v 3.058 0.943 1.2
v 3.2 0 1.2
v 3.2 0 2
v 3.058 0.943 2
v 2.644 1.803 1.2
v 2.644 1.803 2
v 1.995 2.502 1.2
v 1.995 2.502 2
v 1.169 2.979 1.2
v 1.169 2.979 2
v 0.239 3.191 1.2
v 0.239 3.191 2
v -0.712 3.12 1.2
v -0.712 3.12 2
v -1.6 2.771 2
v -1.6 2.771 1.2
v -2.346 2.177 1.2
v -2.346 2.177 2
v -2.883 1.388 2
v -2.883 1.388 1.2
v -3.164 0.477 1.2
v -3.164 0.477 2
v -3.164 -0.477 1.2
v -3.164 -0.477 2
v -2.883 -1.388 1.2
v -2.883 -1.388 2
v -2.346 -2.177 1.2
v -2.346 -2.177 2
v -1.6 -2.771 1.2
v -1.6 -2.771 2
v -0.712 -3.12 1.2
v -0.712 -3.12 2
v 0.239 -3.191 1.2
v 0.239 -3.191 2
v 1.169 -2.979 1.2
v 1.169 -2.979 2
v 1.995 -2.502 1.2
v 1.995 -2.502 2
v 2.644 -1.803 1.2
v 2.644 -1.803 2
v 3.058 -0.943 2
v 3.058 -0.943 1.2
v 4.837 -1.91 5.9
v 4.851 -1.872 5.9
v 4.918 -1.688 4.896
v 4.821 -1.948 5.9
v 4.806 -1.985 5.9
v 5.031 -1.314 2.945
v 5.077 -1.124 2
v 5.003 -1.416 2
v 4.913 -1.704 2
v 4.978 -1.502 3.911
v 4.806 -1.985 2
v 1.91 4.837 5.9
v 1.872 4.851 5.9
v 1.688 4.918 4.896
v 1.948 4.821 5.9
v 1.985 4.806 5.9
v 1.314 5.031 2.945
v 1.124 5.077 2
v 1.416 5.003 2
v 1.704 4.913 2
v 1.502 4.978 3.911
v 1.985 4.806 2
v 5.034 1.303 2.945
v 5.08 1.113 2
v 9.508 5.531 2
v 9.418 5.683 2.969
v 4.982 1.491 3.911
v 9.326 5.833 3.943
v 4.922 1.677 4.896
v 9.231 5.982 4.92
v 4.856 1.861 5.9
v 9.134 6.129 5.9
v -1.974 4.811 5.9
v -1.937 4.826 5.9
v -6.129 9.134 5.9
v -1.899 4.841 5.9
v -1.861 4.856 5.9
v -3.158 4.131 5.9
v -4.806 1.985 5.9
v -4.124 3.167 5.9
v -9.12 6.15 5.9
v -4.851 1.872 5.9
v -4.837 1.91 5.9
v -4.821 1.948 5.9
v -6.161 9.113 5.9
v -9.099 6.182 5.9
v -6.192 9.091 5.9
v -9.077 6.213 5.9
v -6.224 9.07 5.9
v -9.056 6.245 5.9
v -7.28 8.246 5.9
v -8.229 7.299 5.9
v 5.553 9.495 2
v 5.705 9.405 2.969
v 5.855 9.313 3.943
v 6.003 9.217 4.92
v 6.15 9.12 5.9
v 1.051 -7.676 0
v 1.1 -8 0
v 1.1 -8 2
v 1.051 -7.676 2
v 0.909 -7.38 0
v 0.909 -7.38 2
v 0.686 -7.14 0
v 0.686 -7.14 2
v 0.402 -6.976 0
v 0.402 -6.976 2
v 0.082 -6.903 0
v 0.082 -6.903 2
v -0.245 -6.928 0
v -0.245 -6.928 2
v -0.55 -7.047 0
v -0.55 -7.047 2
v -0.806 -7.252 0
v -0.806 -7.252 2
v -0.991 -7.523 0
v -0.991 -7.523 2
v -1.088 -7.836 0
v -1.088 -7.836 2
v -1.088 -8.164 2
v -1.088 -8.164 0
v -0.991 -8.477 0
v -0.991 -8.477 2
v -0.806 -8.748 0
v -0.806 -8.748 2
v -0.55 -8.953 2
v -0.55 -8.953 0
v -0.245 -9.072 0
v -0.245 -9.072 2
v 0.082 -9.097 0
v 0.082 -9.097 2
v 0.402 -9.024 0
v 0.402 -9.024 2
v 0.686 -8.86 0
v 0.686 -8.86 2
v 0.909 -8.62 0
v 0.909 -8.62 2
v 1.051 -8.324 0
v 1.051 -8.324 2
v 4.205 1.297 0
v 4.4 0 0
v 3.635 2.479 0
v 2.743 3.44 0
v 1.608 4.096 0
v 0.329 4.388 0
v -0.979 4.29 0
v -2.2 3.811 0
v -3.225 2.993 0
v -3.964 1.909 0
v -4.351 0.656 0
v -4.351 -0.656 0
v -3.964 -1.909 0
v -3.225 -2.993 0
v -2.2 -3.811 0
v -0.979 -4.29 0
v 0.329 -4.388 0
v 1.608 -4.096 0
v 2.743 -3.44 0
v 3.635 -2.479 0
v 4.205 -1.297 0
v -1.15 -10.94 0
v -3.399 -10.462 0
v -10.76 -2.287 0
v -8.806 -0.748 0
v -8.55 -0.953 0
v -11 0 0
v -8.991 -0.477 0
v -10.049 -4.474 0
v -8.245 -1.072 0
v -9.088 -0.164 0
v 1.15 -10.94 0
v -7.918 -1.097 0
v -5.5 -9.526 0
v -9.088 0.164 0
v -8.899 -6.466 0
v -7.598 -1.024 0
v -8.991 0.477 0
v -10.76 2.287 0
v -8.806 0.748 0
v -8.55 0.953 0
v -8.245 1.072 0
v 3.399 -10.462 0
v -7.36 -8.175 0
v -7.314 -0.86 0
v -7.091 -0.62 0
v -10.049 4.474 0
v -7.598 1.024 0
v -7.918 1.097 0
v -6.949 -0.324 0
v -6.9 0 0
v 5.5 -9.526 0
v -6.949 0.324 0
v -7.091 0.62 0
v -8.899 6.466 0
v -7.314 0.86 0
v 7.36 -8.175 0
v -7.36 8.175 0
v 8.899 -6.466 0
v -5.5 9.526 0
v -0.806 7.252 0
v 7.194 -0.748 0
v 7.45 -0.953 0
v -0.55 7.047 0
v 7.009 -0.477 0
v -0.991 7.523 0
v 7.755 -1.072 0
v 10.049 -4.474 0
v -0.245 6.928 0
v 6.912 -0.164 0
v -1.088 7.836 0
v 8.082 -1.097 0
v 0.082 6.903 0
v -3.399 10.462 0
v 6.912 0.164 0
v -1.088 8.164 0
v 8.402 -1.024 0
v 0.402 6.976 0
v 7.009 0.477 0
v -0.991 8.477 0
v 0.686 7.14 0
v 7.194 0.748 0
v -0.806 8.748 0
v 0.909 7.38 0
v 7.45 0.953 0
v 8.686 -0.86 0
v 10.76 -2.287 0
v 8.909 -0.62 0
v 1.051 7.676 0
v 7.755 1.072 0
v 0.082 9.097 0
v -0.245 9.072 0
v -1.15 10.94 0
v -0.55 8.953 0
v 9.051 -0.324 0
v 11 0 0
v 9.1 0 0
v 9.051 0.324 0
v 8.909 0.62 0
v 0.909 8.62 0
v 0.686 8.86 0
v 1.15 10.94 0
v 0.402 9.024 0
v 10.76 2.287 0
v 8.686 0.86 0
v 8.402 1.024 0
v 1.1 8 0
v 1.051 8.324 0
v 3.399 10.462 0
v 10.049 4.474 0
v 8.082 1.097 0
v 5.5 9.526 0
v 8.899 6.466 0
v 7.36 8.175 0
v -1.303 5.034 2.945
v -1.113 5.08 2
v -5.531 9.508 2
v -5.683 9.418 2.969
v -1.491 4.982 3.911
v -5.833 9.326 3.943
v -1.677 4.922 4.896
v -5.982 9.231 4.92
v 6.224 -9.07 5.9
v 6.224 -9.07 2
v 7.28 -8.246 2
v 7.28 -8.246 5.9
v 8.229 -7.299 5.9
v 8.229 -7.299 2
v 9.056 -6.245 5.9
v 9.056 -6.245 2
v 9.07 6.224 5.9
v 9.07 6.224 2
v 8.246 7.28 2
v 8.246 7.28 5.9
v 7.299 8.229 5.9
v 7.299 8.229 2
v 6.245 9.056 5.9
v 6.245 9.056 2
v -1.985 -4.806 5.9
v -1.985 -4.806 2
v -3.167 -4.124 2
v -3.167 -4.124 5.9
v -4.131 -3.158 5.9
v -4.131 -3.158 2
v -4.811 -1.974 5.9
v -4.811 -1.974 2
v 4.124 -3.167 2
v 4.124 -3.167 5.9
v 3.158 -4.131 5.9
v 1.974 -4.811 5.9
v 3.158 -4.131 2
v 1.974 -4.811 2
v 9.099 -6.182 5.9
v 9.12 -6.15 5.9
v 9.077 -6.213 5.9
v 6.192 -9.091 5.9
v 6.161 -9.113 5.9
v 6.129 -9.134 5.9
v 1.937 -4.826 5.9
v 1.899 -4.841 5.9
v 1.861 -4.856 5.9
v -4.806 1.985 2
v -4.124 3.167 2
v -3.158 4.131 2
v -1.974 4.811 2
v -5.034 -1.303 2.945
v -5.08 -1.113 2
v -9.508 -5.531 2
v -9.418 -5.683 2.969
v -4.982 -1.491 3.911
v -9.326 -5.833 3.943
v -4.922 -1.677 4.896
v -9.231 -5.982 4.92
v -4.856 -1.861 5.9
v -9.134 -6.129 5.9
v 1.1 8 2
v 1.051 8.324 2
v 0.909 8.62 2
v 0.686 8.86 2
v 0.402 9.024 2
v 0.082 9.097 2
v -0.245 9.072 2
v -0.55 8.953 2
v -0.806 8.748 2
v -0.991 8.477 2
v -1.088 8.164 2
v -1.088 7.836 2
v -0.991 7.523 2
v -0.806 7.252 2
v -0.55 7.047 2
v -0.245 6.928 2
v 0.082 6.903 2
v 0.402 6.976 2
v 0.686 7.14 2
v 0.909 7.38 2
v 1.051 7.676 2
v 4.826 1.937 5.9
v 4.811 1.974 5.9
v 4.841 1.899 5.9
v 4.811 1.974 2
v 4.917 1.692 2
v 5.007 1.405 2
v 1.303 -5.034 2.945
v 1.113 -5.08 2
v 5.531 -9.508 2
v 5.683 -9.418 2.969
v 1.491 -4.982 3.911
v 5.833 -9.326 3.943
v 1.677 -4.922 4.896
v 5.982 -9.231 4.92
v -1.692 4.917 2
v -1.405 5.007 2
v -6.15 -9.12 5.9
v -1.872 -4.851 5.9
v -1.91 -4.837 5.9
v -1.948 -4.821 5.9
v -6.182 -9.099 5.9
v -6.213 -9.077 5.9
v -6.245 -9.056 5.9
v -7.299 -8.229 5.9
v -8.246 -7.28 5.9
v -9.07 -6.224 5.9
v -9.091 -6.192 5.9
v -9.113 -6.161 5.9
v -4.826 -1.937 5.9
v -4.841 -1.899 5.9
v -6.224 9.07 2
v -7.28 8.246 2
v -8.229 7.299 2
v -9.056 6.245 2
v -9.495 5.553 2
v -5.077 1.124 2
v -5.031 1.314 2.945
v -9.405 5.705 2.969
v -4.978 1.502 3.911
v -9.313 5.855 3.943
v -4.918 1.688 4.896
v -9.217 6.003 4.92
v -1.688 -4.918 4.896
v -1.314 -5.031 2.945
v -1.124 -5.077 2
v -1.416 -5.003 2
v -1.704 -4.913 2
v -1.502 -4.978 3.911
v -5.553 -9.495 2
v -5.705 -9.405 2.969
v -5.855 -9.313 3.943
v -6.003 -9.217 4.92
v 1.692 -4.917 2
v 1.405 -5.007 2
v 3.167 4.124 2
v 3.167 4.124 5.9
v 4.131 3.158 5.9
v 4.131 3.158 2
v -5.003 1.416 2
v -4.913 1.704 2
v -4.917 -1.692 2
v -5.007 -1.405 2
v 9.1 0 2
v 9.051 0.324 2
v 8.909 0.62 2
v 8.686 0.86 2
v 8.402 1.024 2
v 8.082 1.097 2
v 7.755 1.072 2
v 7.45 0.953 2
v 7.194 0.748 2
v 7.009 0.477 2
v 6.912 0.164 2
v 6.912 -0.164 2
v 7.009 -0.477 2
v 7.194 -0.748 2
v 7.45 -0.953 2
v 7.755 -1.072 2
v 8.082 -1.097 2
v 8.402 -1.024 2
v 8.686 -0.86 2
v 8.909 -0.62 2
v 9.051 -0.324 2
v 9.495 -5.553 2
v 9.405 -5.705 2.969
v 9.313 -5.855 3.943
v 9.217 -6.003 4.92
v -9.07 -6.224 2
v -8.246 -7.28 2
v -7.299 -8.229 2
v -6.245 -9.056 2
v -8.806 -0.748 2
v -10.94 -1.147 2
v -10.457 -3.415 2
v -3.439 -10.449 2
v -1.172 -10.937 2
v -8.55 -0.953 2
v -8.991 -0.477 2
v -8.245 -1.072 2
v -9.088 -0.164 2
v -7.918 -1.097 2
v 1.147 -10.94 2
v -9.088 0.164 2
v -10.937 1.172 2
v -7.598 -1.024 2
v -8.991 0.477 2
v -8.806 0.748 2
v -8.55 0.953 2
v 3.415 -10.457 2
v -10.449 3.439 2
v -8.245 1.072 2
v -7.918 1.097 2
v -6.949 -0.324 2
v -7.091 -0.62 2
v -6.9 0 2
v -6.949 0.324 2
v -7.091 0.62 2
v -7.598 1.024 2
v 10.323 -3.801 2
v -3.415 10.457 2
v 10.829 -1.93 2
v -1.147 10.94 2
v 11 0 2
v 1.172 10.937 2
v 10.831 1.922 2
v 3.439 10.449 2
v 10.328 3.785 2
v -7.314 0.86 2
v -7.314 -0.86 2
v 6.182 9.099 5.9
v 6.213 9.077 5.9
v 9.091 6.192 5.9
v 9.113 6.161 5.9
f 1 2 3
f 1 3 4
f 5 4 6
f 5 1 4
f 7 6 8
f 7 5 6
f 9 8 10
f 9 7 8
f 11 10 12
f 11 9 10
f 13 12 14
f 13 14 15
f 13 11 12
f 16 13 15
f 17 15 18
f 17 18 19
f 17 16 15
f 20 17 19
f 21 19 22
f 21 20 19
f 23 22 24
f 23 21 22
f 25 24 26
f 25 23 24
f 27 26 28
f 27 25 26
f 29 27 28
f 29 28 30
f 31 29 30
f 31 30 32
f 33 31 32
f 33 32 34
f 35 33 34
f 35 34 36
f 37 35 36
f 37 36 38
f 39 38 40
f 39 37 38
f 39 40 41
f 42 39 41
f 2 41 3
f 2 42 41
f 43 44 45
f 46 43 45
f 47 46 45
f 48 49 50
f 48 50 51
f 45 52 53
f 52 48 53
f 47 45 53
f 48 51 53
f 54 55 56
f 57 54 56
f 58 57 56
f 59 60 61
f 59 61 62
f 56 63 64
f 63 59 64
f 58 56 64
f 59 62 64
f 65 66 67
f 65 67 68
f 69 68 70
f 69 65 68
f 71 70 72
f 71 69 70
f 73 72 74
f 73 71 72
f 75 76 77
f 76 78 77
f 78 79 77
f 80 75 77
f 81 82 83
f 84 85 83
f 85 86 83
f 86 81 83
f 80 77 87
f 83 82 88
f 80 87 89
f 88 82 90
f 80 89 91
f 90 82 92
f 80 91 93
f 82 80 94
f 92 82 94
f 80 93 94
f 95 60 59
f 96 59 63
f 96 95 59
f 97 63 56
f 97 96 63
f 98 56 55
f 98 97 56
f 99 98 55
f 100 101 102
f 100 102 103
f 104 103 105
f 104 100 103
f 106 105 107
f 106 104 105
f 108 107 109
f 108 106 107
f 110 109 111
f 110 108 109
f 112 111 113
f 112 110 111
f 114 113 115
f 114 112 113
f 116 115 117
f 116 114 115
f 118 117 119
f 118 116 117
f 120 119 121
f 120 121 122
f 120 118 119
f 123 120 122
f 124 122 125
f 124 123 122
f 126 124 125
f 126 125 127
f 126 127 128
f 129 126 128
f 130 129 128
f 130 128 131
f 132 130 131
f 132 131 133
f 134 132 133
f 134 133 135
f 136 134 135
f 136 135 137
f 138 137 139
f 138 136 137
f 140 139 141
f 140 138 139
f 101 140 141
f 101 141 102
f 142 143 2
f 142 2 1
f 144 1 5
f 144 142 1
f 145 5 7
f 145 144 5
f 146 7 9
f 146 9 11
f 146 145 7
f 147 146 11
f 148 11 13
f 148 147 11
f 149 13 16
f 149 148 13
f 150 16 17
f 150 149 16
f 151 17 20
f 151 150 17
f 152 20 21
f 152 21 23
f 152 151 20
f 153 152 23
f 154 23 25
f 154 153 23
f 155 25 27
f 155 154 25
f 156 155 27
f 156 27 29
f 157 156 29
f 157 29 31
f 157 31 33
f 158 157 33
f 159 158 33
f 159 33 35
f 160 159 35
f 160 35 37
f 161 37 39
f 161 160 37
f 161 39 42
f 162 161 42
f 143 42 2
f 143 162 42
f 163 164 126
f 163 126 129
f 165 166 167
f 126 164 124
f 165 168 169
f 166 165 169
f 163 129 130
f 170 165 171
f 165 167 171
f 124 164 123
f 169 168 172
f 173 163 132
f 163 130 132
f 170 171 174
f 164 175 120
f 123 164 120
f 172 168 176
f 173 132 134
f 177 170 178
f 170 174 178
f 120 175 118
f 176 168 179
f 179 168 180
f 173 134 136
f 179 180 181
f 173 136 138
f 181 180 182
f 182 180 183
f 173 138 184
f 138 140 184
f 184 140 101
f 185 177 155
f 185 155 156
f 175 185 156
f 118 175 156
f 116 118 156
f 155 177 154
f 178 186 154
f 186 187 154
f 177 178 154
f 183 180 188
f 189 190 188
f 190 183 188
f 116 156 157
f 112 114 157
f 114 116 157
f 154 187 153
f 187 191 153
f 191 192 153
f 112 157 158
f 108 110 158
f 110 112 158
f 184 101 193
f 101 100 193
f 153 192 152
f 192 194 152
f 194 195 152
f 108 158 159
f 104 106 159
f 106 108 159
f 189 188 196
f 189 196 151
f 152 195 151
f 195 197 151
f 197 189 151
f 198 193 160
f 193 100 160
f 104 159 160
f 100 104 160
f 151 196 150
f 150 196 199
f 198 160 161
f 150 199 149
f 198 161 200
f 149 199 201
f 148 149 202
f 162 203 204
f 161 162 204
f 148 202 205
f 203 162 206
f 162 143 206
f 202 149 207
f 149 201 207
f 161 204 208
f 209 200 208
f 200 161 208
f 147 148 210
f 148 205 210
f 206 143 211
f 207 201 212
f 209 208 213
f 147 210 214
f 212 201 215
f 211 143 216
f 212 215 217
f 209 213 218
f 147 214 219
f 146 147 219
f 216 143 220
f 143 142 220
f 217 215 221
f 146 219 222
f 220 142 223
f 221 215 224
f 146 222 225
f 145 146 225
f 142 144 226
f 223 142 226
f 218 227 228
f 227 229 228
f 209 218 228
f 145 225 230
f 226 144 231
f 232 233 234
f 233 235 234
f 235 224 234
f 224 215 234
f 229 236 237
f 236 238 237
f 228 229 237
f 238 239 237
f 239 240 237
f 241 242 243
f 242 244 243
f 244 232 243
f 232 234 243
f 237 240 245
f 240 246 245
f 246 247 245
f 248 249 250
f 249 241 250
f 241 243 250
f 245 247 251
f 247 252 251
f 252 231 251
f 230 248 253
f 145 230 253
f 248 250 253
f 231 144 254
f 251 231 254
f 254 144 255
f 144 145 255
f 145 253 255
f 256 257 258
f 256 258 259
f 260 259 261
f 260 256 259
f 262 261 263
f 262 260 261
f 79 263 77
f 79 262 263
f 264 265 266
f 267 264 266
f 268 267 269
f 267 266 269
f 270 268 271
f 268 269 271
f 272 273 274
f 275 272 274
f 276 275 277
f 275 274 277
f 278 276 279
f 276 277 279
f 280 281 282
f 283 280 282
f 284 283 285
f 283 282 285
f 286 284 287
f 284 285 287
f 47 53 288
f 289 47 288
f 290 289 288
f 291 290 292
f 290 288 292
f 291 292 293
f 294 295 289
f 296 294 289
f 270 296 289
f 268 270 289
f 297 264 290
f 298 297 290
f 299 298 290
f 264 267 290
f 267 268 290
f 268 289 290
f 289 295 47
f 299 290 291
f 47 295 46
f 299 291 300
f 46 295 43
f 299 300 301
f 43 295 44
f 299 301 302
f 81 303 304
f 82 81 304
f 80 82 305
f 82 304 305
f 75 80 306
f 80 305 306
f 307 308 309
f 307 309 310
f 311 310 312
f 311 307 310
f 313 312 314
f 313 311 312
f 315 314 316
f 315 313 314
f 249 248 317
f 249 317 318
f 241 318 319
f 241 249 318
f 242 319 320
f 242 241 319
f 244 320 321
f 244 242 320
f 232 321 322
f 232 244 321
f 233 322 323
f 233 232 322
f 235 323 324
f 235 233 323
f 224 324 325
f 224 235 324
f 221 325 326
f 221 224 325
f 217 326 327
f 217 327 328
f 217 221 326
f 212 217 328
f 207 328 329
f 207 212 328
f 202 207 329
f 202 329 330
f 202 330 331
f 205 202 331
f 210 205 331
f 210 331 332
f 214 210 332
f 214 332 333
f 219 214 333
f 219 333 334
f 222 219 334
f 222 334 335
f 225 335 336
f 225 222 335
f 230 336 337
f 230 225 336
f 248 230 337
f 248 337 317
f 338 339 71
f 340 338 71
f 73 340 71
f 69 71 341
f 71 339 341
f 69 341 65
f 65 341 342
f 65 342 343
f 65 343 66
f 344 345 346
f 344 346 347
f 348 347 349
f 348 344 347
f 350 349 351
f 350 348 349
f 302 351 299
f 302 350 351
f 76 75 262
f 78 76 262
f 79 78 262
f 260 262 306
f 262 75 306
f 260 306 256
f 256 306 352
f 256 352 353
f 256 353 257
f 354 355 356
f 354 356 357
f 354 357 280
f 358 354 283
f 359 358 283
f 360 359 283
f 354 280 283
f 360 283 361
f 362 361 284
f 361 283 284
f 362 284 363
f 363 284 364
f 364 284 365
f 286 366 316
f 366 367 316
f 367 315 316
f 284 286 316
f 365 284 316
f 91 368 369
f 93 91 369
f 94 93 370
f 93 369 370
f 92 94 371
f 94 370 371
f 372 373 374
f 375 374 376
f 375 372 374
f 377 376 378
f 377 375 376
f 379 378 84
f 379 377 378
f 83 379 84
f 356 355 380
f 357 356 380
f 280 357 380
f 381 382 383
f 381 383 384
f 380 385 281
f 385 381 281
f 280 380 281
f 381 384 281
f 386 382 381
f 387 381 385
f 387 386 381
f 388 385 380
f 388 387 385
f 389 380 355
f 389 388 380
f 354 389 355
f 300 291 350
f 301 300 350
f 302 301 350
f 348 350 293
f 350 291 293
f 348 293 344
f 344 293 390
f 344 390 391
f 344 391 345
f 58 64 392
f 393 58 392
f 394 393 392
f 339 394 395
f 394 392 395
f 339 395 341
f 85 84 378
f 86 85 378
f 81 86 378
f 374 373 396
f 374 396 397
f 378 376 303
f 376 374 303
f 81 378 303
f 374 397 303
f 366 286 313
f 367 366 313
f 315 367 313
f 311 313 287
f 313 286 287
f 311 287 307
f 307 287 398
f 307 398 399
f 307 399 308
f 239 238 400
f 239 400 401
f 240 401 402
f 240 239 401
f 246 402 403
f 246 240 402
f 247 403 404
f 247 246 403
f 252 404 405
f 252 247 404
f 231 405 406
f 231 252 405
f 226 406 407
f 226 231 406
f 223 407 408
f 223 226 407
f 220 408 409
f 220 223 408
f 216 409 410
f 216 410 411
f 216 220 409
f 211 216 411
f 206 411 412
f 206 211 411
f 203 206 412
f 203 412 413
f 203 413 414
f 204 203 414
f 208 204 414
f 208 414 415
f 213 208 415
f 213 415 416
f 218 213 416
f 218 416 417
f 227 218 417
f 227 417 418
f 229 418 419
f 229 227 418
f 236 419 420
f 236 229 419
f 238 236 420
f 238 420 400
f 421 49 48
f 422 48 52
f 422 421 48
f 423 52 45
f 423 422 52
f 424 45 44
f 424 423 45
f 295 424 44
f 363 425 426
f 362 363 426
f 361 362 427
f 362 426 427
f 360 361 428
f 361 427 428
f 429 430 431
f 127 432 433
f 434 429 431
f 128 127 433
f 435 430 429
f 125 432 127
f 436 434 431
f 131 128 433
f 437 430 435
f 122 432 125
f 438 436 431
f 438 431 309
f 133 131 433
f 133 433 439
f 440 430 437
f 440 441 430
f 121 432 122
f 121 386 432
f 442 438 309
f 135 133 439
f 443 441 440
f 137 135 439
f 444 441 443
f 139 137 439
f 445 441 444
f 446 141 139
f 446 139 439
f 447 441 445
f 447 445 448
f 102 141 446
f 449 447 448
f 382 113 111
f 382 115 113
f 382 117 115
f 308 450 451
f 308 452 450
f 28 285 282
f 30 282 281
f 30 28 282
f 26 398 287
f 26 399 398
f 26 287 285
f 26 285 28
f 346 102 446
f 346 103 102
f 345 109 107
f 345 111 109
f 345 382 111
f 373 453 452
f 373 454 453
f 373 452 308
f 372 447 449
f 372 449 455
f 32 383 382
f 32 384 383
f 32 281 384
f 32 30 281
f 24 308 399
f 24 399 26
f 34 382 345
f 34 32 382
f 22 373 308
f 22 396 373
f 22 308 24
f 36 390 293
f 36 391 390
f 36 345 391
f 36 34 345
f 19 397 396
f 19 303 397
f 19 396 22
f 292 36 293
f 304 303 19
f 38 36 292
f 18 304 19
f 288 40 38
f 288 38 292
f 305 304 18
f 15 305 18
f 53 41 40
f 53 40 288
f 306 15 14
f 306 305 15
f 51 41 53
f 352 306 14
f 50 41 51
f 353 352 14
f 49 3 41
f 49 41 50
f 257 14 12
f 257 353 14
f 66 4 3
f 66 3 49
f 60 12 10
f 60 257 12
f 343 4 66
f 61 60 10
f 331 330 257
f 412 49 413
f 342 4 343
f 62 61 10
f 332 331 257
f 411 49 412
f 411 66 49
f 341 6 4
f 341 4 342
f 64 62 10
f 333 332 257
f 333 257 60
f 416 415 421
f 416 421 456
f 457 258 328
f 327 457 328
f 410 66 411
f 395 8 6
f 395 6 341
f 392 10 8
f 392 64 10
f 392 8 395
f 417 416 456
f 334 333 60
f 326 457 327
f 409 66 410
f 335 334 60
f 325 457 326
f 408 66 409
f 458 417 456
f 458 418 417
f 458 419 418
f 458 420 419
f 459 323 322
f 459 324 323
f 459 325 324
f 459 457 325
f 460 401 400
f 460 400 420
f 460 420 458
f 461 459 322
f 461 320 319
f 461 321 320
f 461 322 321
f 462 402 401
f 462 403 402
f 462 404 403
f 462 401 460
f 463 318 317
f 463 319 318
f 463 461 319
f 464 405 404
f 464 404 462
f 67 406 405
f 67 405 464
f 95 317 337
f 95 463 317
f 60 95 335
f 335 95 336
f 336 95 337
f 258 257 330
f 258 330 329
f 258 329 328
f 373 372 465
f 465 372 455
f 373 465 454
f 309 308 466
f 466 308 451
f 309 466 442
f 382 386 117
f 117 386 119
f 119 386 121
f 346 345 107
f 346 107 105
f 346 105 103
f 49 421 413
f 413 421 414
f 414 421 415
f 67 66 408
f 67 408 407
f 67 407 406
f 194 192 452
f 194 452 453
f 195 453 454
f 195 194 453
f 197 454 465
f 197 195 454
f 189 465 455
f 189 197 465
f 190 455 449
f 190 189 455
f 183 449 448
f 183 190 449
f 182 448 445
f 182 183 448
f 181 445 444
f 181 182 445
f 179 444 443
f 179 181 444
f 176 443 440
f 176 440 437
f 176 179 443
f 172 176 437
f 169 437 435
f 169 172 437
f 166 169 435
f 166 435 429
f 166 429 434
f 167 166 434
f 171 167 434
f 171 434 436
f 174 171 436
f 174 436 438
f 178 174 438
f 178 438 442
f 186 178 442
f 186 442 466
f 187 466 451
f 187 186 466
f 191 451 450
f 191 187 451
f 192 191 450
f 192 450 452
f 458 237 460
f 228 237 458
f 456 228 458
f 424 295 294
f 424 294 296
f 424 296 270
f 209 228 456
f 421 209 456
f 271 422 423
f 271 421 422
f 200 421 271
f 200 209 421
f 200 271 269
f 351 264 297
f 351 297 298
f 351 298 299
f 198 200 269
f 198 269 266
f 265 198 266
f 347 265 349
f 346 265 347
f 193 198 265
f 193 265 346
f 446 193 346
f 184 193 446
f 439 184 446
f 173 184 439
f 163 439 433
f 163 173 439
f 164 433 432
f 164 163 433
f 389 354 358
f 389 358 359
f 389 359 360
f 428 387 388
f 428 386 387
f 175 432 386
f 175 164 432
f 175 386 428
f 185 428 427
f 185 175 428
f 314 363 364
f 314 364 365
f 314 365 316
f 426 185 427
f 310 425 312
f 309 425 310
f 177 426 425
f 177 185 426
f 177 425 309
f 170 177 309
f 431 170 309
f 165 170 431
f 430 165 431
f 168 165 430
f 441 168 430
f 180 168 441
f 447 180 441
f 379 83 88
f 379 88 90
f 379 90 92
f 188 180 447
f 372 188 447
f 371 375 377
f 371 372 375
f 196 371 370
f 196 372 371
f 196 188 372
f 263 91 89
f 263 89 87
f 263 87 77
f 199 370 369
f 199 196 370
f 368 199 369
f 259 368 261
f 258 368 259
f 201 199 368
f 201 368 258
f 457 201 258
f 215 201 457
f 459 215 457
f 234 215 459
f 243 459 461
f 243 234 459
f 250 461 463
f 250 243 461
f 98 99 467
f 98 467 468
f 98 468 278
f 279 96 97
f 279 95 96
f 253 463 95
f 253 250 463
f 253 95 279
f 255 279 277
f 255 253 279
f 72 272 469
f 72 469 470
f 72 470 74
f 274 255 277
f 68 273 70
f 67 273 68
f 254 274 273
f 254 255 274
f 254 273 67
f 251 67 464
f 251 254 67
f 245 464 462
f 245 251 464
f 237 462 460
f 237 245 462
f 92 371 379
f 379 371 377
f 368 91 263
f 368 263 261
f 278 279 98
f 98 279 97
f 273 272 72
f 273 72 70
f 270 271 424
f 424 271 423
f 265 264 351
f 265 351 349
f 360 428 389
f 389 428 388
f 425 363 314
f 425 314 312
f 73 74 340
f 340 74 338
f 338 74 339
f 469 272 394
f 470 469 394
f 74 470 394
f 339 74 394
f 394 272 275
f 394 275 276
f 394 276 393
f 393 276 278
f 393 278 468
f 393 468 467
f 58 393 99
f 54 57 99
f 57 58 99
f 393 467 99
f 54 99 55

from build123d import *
from build123d.topology import SkipClean

# Parameters (mm, degrees)
SZKIC1_R                    = 11
SZKIC1_R_2                  = 1.1
SZKIC1_R_3                  = 3.2
DODANIE_WYCI_GNI_CIE1_DEPTH = 2
SFAZOWANIE1_SIZE            = 1.2
DODANIE_WYCI_GNI_CIE2_DEPTH = 3.9
SZYK_KO_OWY1_COUNT          = 4


with BuildPart() as part:
    # Szkic1 → Dodanie-wyciągnięcie1 (new body)
    with BuildSketch(Plane.XY):
        Circle(SZKIC1_R)
        with Locations((0, 8)):
            Circle(SZKIC1_R_2, mode=Mode.SUBTRACT)
        with Locations((8, 0)):
            Circle(SZKIC1_R_2, mode=Mode.SUBTRACT)
        with Locations((0, -8)):
            Circle(SZKIC1_R_2, mode=Mode.SUBTRACT)
        with Locations((-8, 0)):
            Circle(SZKIC1_R_2, mode=Mode.SUBTRACT)
        Circle(SZKIC1_R_3, mode=Mode.SUBTRACT)
    extrude(amount=DODANIE_WYCI_GNI_CIE1_DEPTH)

    # Sfazowanie1
    sfazowanie1_edges = [part.edges().sort_by_distance(p)[0] for p in [
        (-3.2, 0, 0),
    ]]
    chamfer(sfazowanie1_edges, length=SFAZOWANIE1_SIZE)

    # Szkic2 → Dodanie-wyciągnięcie2 (add)
    with BuildSketch(Plane.XY.offset(2)):
        with BuildLine():
            ThreePointArc((-1.985434, -4.806043), (-3.681187, -3.672719), (-4.810603, -1.974361))
            Line((-4.810603, -1.974361), (-9.069916, -6.223876))
            ThreePointArc((-9.069916, -6.223876), (-7.787126, -7.769213), (-6.244747, -9.055558))
            Line((-6.244747, -9.055558), (-1.985434, -4.806043))
        make_face()
    dodanie_wyci_gni_cie2 = extrude(amount=DODANIE_WYCI_GNI_CIE2_DEPTH)

    # Sfazowanie2
    # the kernel refuses this chamfer: 4.537025, 0.8 mm, written as the material it adds along each edge
    with BuildSketch(Plane(origin=(-9.583198, -12.386329, 2), x_dir=(0.6905216935845088, -0.6921137853794768, -0.21013876076743532), z_dir=(0.7079205386909484, 0.7062920861085148, 0))) as sfazowanie2_piece_1_section:
        with BuildLine():
            Line((0.850504, 0), (-1.021772, -4.603832))
            Line((-1.021772, -4.603832), (-1.110486, -4.584764))
            ThreePointArc((-1.110486, -4.584764), (-0.584195, -2.286159), (-0.088714, 0.019068))
            Line((-0.088714, 0.019068), (0.019068, 0.088714))
            ThreePointArc((0.019068, 0.088714), (0.425542, 0.001348), (0.869572, 0.088714))
            Line((0.869572, 0.088714), (0.850504, 0))
        make_face()
    sfazowanie2_piece_1 = extrude(amount=15.448363, mode=Mode.PRIVATE)
    sfazowanie2_piece_1 = sfazowanie2_piece_1 & Plane(origin=(0, 0, 3.473848), x_dir=(1, 0, 0), z_dir=(0, 0, -1)) * Cylinder(11, 50, mode=Mode.PRIVATE)
    sfazowanie2_piece_1 = sfazowanie2_piece_1 - Plane(origin=(0, 0, 3.473848), x_dir=(-0.38181431028836865, -0.9242390559043788, 0), z_dir=(0, 0, -1)) * Cylinder(5.2, 50, mode=Mode.PRIVATE)
    sfazowanie2_piece_1 = split(sfazowanie2_piece_1, bisect_by=Plane(origin=(-3.895318, -7.039482, 5.9), z_dir=(0, 0, -1)), keep=Keep.TOP, mode=Mode.PRIVATE)
    add(sfazowanie2_piece_1)
    with BuildSketch(Plane(origin=(-1.472152, 1.35641, 2), x_dir=(-0.690521693584509, 0.6921137853794764, -0.21013876076743535), z_dir=(-0.7079205386909481, -0.706292086108515, 0))) as sfazowanie2_piece_2_section:
        with BuildLine():
            Line((0.850504, 0), (-1.021772, -4.603832))
            Line((-1.021772, -4.603832), (-1.110486, -4.584764))
            ThreePointArc((-1.110486, -4.584764), (-0.584195, -2.286159), (-0.088714, 0.019068))
            Line((-0.088714, 0.019068), (0.019068, 0.088714))
            ThreePointArc((0.019068, 0.088714), (0.425542, 0.001348), (0.869572, 0.088714))
            Line((0.869572, 0.088714), (0.850504, 0))
        make_face()
    sfazowanie2_piece_2 = extrude(amount=15.448363, mode=Mode.PRIVATE)
    sfazowanie2_piece_2 = sfazowanie2_piece_2 - Plane(origin=(0, 0, 3.473848), x_dir=(-0.38181431028836865, -0.9242390559043788, 0), z_dir=(0, 0, -1)) * Cylinder(5.2, 50, mode=Mode.PRIVATE)
    sfazowanie2_piece_2 = sfazowanie2_piece_2 & Plane(origin=(0, 0, 3.473848), x_dir=(1, 0, 0), z_dir=(0, 0, -1)) * Cylinder(11, 50, mode=Mode.PRIVATE)
    sfazowanie2_piece_2 = split(sfazowanie2_piece_2, bisect_by=Plane(origin=(-7.048434, -3.879096, 5.9), z_dir=(0, 0, -1)), keep=Keep.TOP, mode=Mode.PRIVATE)
    add(sfazowanie2_piece_2)

    # Szyk kołowy1: Dodanie-wyciągnięcie2 ×4 about axis
    with SkipClean():  # the faces are left unmerged after this step: merging them gives an invalid solid
        szyk_ko_owy1_axis = Axis((0, 0, 0), (0, 0, 1))
        for i in range(1, SZYK_KO_OWY1_COUNT):
            add(dodanie_wyci_gni_cie2.rotate(szyk_ko_owy1_axis, i * 360 / SZYK_KO_OWY1_COUNT))

    # Sfazowanie2 of Szyk kołowy1
    # the kernel refuses this chamfer: 4.537025, 0.8 mm, written as the material it adds along each edge
    with BuildSketch(Plane(origin=(12.386329, -9.583198, 2), x_dir=(0.6921137853794768, 0.6905216935845088, -0.21013876076743532), z_dir=(-0.7062920861085147, 0.7079205386909485, 0))) as sfazowanie2_of_szyk_ko_owy1_piece_1_section:
        with BuildLine():
            Line((0.850504, 0), (-1.021772, -4.603832))
            Line((-1.021772, -4.603832), (-1.110486, -4.584764))
            ThreePointArc((-1.110486, -4.584764), (-0.584195, -2.286159), (-0.088714, 0.019068))
            Line((-0.088714, 0.019068), (0.019068, 0.088714))
            ThreePointArc((0.019068, 0.088714), (0.425542, 0.001348), (0.869572, 0.088714))
            Line((0.869572, 0.088714), (0.850504, 0))
        make_face()
    sfazowanie2_of_szyk_ko_owy1_piece_1 = extrude(amount=15.448363, mode=Mode.PRIVATE)
    sfazowanie2_of_szyk_ko_owy1_piece_1 = sfazowanie2_of_szyk_ko_owy1_piece_1 & Plane(origin=(0, 0, 3.473848), x_dir=(1, 0, 0), z_dir=(0, 0, -1)) * Cylinder(11, 50, mode=Mode.PRIVATE)
    sfazowanie2_of_szyk_ko_owy1_piece_1 = sfazowanie2_of_szyk_ko_owy1_piece_1 - Plane(origin=(0, 0, 3.473848), x_dir=(0.9242390559043788, -0.38181431028836876, 0), z_dir=(0, 0, -1)) * Cylinder(5.2, 50, mode=Mode.PRIVATE)
    sfazowanie2_of_szyk_ko_owy1_piece_1 = split(sfazowanie2_of_szyk_ko_owy1_piece_1, bisect_by=Plane(origin=(7.039482, -3.895318, 5.9), z_dir=(0, 0, -1)), keep=Keep.TOP, mode=Mode.PRIVATE)
    add(sfazowanie2_of_szyk_ko_owy1_piece_1)
    with BuildSketch(Plane(origin=(-1.35641, -1.472152, 2), x_dir=(-0.6921137853794764, -0.690521693584509, -0.21013876076743537), z_dir=(0.7062920861085149, -0.7079205386909482, 0))) as sfazowanie2_of_szyk_ko_owy1_piece_2_section:
        with BuildLine():
            Line((0.850504, 0), (-1.021772, -4.603832))
            Line((-1.021772, -4.603832), (-1.110486, -4.584764))
            ThreePointArc((-1.110486, -4.584764), (-0.584195, -2.286159), (-0.088714, 0.019068))
            Line((-0.088714, 0.019068), (0.019068, 0.088714))
            ThreePointArc((0.019068, 0.088714), (0.425542, 0.001348), (0.869572, 0.088714))
            Line((0.869572, 0.088714), (0.850504, 0))
        make_face()
    sfazowanie2_of_szyk_ko_owy1_piece_2 = extrude(amount=15.448363, mode=Mode.PRIVATE)
    sfazowanie2_of_szyk_ko_owy1_piece_2 = sfazowanie2_of_szyk_ko_owy1_piece_2 - Plane(origin=(0, 0, 3.473848), x_dir=(0.9242390559043788, -0.38181431028836876, 0), z_dir=(0, 0, -1)) * Cylinder(5.2, 50, mode=Mode.PRIVATE)
    sfazowanie2_of_szyk_ko_owy1_piece_2 = sfazowanie2_of_szyk_ko_owy1_piece_2 & Plane(origin=(0, 0, 3.473848), x_dir=(1, 0, 0), z_dir=(0, 0, -1)) * Cylinder(11, 50, mode=Mode.PRIVATE)
    sfazowanie2_of_szyk_ko_owy1_piece_2 = split(sfazowanie2_of_szyk_ko_owy1_piece_2, bisect_by=Plane(origin=(3.879096, -7.048434, 5.9), z_dir=(0, 0, -1)), keep=Keep.TOP, mode=Mode.PRIVATE)
    add(sfazowanie2_of_szyk_ko_owy1_piece_2)
    with BuildSketch(Plane(origin=(9.583198, 12.386329, 2), x_dir=(-0.6905216935845088, 0.6921137853794768, -0.21013876076743532), z_dir=(-0.7079205386909485, -0.7062920861085147, 0))) as sfazowanie2_of_szyk_ko_owy1_piece_3_section:
        with BuildLine():
            Line((0.850504, 0), (-1.021772, -4.603832))
            Line((-1.021772, -4.603832), (-1.110486, -4.584764))
            ThreePointArc((-1.110486, -4.584764), (-0.584195, -2.286159), (-0.088714, 0.019068))
            Line((-0.088714, 0.019068), (0.019068, 0.088714))
            ThreePointArc((0.019068, 0.088714), (0.425542, 0.001348), (0.869572, 0.088714))
            Line((0.869572, 0.088714), (0.850504, 0))
        make_face()
    sfazowanie2_of_szyk_ko_owy1_piece_3 = extrude(amount=15.448363, mode=Mode.PRIVATE)
    sfazowanie2_of_szyk_ko_owy1_piece_3 = sfazowanie2_of_szyk_ko_owy1_piece_3 & Plane(origin=(0, 0, 3.473848), x_dir=(1, 0, 0), z_dir=(0, 0, -1)) * Cylinder(11, 50, mode=Mode.PRIVATE)
    sfazowanie2_of_szyk_ko_owy1_piece_3 = sfazowanie2_of_szyk_ko_owy1_piece_3 - Plane(origin=(0, 0, 3.473848), x_dir=(0.38181431028836876, 0.9242390559043788, 0), z_dir=(0, 0, -1)) * Cylinder(5.2, 50, mode=Mode.PRIVATE)
    sfazowanie2_of_szyk_ko_owy1_piece_3 = split(sfazowanie2_of_szyk_ko_owy1_piece_3, bisect_by=Plane(origin=(3.895318, 7.039482, 5.9), z_dir=(0, 0, -1)), keep=Keep.TOP, mode=Mode.PRIVATE)
    add(sfazowanie2_of_szyk_ko_owy1_piece_3)
    with BuildSketch(Plane(origin=(1.472152, -1.35641, 2), x_dir=(0.6905216935845091, -0.6921137853794765, -0.21013876076743537), z_dir=(0.7079205386909482, 0.7062920861085149, 0))) as sfazowanie2_of_szyk_ko_owy1_piece_4_section:
        with BuildLine():
            Line((0.850504, 0), (-1.021772, -4.603832))
            Line((-1.021772, -4.603832), (-1.110486, -4.584764))
            ThreePointArc((-1.110486, -4.584764), (-0.584195, -2.286159), (-0.088714, 0.019068))
            Line((-0.088714, 0.019068), (0.019068, 0.088714))
            ThreePointArc((0.019068, 0.088714), (0.425542, 0.001348), (0.869572, 0.088714))
            Line((0.869572, 0.088714), (0.850504, 0))
        make_face()
    sfazowanie2_of_szyk_ko_owy1_piece_4 = extrude(amount=15.448363, mode=Mode.PRIVATE)
    sfazowanie2_of_szyk_ko_owy1_piece_4 = sfazowanie2_of_szyk_ko_owy1_piece_4 - Plane(origin=(0, 0, 3.473848), x_dir=(0.38181431028836876, 0.9242390559043788, 0), z_dir=(0, 0, -1)) * Cylinder(5.2, 50, mode=Mode.PRIVATE)
    sfazowanie2_of_szyk_ko_owy1_piece_4 = sfazowanie2_of_szyk_ko_owy1_piece_4 & Plane(origin=(0, 0, 3.473848), x_dir=(1, 0, 0), z_dir=(0, 0, -1)) * Cylinder(11, 50, mode=Mode.PRIVATE)
    sfazowanie2_of_szyk_ko_owy1_piece_4 = split(sfazowanie2_of_szyk_ko_owy1_piece_4, bisect_by=Plane(origin=(7.048434, 3.879096, 5.9), z_dir=(0, 0, -1)), keep=Keep.TOP, mode=Mode.PRIVATE)
    add(sfazowanie2_of_szyk_ko_owy1_piece_4)
    with BuildSketch(Plane(origin=(-12.386329, 9.583198, 2), x_dir=(-0.6921137853794768, -0.6905216935845088, -0.21013876076743532), z_dir=(0.7062920861085147, -0.7079205386909485, 0))) as sfazowanie2_of_szyk_ko_owy1_piece_5_section:
        with BuildLine():
            Line((0.850504, 0), (-1.021772, -4.603832))
            Line((-1.021772, -4.603832), (-1.110486, -4.584764))
            ThreePointArc((-1.110486, -4.584764), (-0.584195, -2.286159), (-0.088714, 0.019068))
            Line((-0.088714, 0.019068), (0.019068, 0.088714))
            ThreePointArc((0.019068, 0.088714), (0.425542, 0.001348), (0.869572, 0.088714))
            Line((0.869572, 0.088714), (0.850504, 0))
        make_face()
    sfazowanie2_of_szyk_ko_owy1_piece_5 = extrude(amount=15.448363, mode=Mode.PRIVATE)
    sfazowanie2_of_szyk_ko_owy1_piece_5 = sfazowanie2_of_szyk_ko_owy1_piece_5 & Plane(origin=(0, 0, 3.473848), x_dir=(1, 0, 0), z_dir=(0, 0, -1)) * Cylinder(11, 50, mode=Mode.PRIVATE)
    sfazowanie2_of_szyk_ko_owy1_piece_5 = sfazowanie2_of_szyk_ko_owy1_piece_5 - Plane(origin=(0, 0, 3.473848), x_dir=(-0.9242390559043787, 0.3818143102883689, 0), z_dir=(0, 0, -1)) * Cylinder(5.2, 50, mode=Mode.PRIVATE)
    sfazowanie2_of_szyk_ko_owy1_piece_5 = split(sfazowanie2_of_szyk_ko_owy1_piece_5, bisect_by=Plane(origin=(-7.039482, 3.895318, 5.9), z_dir=(0, 0, -1)), keep=Keep.TOP, mode=Mode.PRIVATE)
    add(sfazowanie2_of_szyk_ko_owy1_piece_5)
    with BuildSketch(Plane(origin=(1.35641, 1.472152, 2), x_dir=(0.6921137853794764, 0.690521693584509, -0.21013876076743535), z_dir=(-0.7062920861085149, 0.7079205386909482, 0))) as sfazowanie2_of_szyk_ko_owy1_piece_6_section:
        with BuildLine():
            Line((0.850504, 0), (-1.021772, -4.603832))
            Line((-1.021772, -4.603832), (-1.110486, -4.584764))
            ThreePointArc((-1.110486, -4.584764), (-0.584195, -2.286159), (-0.088714, 0.019068))
            Line((-0.088714, 0.019068), (0.019068, 0.088714))
            ThreePointArc((0.019068, 0.088714), (0.425542, 0.001348), (0.869572, 0.088714))
            Line((0.869572, 0.088714), (0.850504, 0))
        make_face()
    sfazowanie2_of_szyk_ko_owy1_piece_6 = extrude(amount=15.448363, mode=Mode.PRIVATE)
    sfazowanie2_of_szyk_ko_owy1_piece_6 = sfazowanie2_of_szyk_ko_owy1_piece_6 - Plane(origin=(0, 0, 3.473848), x_dir=(-0.9242390559043787, 0.3818143102883689, 0), z_dir=(0, 0, -1)) * Cylinder(5.2, 50, mode=Mode.PRIVATE)
    sfazowanie2_of_szyk_ko_owy1_piece_6 = sfazowanie2_of_szyk_ko_owy1_piece_6 & Plane(origin=(0, 0, 3.473848), x_dir=(1, 0, 0), z_dir=(0, 0, -1)) * Cylinder(11, 50, mode=Mode.PRIVATE)
    sfazowanie2_of_szyk_ko_owy1_piece_6 = split(sfazowanie2_of_szyk_ko_owy1_piece_6, bisect_by=Plane(origin=(-3.879096, 7.048434, 5.9), z_dir=(0, 0, -1)), keep=Keep.TOP, mode=Mode.PRIVATE)
    add(sfazowanie2_of_szyk_ko_owy1_piece_6)


solid = part.part
